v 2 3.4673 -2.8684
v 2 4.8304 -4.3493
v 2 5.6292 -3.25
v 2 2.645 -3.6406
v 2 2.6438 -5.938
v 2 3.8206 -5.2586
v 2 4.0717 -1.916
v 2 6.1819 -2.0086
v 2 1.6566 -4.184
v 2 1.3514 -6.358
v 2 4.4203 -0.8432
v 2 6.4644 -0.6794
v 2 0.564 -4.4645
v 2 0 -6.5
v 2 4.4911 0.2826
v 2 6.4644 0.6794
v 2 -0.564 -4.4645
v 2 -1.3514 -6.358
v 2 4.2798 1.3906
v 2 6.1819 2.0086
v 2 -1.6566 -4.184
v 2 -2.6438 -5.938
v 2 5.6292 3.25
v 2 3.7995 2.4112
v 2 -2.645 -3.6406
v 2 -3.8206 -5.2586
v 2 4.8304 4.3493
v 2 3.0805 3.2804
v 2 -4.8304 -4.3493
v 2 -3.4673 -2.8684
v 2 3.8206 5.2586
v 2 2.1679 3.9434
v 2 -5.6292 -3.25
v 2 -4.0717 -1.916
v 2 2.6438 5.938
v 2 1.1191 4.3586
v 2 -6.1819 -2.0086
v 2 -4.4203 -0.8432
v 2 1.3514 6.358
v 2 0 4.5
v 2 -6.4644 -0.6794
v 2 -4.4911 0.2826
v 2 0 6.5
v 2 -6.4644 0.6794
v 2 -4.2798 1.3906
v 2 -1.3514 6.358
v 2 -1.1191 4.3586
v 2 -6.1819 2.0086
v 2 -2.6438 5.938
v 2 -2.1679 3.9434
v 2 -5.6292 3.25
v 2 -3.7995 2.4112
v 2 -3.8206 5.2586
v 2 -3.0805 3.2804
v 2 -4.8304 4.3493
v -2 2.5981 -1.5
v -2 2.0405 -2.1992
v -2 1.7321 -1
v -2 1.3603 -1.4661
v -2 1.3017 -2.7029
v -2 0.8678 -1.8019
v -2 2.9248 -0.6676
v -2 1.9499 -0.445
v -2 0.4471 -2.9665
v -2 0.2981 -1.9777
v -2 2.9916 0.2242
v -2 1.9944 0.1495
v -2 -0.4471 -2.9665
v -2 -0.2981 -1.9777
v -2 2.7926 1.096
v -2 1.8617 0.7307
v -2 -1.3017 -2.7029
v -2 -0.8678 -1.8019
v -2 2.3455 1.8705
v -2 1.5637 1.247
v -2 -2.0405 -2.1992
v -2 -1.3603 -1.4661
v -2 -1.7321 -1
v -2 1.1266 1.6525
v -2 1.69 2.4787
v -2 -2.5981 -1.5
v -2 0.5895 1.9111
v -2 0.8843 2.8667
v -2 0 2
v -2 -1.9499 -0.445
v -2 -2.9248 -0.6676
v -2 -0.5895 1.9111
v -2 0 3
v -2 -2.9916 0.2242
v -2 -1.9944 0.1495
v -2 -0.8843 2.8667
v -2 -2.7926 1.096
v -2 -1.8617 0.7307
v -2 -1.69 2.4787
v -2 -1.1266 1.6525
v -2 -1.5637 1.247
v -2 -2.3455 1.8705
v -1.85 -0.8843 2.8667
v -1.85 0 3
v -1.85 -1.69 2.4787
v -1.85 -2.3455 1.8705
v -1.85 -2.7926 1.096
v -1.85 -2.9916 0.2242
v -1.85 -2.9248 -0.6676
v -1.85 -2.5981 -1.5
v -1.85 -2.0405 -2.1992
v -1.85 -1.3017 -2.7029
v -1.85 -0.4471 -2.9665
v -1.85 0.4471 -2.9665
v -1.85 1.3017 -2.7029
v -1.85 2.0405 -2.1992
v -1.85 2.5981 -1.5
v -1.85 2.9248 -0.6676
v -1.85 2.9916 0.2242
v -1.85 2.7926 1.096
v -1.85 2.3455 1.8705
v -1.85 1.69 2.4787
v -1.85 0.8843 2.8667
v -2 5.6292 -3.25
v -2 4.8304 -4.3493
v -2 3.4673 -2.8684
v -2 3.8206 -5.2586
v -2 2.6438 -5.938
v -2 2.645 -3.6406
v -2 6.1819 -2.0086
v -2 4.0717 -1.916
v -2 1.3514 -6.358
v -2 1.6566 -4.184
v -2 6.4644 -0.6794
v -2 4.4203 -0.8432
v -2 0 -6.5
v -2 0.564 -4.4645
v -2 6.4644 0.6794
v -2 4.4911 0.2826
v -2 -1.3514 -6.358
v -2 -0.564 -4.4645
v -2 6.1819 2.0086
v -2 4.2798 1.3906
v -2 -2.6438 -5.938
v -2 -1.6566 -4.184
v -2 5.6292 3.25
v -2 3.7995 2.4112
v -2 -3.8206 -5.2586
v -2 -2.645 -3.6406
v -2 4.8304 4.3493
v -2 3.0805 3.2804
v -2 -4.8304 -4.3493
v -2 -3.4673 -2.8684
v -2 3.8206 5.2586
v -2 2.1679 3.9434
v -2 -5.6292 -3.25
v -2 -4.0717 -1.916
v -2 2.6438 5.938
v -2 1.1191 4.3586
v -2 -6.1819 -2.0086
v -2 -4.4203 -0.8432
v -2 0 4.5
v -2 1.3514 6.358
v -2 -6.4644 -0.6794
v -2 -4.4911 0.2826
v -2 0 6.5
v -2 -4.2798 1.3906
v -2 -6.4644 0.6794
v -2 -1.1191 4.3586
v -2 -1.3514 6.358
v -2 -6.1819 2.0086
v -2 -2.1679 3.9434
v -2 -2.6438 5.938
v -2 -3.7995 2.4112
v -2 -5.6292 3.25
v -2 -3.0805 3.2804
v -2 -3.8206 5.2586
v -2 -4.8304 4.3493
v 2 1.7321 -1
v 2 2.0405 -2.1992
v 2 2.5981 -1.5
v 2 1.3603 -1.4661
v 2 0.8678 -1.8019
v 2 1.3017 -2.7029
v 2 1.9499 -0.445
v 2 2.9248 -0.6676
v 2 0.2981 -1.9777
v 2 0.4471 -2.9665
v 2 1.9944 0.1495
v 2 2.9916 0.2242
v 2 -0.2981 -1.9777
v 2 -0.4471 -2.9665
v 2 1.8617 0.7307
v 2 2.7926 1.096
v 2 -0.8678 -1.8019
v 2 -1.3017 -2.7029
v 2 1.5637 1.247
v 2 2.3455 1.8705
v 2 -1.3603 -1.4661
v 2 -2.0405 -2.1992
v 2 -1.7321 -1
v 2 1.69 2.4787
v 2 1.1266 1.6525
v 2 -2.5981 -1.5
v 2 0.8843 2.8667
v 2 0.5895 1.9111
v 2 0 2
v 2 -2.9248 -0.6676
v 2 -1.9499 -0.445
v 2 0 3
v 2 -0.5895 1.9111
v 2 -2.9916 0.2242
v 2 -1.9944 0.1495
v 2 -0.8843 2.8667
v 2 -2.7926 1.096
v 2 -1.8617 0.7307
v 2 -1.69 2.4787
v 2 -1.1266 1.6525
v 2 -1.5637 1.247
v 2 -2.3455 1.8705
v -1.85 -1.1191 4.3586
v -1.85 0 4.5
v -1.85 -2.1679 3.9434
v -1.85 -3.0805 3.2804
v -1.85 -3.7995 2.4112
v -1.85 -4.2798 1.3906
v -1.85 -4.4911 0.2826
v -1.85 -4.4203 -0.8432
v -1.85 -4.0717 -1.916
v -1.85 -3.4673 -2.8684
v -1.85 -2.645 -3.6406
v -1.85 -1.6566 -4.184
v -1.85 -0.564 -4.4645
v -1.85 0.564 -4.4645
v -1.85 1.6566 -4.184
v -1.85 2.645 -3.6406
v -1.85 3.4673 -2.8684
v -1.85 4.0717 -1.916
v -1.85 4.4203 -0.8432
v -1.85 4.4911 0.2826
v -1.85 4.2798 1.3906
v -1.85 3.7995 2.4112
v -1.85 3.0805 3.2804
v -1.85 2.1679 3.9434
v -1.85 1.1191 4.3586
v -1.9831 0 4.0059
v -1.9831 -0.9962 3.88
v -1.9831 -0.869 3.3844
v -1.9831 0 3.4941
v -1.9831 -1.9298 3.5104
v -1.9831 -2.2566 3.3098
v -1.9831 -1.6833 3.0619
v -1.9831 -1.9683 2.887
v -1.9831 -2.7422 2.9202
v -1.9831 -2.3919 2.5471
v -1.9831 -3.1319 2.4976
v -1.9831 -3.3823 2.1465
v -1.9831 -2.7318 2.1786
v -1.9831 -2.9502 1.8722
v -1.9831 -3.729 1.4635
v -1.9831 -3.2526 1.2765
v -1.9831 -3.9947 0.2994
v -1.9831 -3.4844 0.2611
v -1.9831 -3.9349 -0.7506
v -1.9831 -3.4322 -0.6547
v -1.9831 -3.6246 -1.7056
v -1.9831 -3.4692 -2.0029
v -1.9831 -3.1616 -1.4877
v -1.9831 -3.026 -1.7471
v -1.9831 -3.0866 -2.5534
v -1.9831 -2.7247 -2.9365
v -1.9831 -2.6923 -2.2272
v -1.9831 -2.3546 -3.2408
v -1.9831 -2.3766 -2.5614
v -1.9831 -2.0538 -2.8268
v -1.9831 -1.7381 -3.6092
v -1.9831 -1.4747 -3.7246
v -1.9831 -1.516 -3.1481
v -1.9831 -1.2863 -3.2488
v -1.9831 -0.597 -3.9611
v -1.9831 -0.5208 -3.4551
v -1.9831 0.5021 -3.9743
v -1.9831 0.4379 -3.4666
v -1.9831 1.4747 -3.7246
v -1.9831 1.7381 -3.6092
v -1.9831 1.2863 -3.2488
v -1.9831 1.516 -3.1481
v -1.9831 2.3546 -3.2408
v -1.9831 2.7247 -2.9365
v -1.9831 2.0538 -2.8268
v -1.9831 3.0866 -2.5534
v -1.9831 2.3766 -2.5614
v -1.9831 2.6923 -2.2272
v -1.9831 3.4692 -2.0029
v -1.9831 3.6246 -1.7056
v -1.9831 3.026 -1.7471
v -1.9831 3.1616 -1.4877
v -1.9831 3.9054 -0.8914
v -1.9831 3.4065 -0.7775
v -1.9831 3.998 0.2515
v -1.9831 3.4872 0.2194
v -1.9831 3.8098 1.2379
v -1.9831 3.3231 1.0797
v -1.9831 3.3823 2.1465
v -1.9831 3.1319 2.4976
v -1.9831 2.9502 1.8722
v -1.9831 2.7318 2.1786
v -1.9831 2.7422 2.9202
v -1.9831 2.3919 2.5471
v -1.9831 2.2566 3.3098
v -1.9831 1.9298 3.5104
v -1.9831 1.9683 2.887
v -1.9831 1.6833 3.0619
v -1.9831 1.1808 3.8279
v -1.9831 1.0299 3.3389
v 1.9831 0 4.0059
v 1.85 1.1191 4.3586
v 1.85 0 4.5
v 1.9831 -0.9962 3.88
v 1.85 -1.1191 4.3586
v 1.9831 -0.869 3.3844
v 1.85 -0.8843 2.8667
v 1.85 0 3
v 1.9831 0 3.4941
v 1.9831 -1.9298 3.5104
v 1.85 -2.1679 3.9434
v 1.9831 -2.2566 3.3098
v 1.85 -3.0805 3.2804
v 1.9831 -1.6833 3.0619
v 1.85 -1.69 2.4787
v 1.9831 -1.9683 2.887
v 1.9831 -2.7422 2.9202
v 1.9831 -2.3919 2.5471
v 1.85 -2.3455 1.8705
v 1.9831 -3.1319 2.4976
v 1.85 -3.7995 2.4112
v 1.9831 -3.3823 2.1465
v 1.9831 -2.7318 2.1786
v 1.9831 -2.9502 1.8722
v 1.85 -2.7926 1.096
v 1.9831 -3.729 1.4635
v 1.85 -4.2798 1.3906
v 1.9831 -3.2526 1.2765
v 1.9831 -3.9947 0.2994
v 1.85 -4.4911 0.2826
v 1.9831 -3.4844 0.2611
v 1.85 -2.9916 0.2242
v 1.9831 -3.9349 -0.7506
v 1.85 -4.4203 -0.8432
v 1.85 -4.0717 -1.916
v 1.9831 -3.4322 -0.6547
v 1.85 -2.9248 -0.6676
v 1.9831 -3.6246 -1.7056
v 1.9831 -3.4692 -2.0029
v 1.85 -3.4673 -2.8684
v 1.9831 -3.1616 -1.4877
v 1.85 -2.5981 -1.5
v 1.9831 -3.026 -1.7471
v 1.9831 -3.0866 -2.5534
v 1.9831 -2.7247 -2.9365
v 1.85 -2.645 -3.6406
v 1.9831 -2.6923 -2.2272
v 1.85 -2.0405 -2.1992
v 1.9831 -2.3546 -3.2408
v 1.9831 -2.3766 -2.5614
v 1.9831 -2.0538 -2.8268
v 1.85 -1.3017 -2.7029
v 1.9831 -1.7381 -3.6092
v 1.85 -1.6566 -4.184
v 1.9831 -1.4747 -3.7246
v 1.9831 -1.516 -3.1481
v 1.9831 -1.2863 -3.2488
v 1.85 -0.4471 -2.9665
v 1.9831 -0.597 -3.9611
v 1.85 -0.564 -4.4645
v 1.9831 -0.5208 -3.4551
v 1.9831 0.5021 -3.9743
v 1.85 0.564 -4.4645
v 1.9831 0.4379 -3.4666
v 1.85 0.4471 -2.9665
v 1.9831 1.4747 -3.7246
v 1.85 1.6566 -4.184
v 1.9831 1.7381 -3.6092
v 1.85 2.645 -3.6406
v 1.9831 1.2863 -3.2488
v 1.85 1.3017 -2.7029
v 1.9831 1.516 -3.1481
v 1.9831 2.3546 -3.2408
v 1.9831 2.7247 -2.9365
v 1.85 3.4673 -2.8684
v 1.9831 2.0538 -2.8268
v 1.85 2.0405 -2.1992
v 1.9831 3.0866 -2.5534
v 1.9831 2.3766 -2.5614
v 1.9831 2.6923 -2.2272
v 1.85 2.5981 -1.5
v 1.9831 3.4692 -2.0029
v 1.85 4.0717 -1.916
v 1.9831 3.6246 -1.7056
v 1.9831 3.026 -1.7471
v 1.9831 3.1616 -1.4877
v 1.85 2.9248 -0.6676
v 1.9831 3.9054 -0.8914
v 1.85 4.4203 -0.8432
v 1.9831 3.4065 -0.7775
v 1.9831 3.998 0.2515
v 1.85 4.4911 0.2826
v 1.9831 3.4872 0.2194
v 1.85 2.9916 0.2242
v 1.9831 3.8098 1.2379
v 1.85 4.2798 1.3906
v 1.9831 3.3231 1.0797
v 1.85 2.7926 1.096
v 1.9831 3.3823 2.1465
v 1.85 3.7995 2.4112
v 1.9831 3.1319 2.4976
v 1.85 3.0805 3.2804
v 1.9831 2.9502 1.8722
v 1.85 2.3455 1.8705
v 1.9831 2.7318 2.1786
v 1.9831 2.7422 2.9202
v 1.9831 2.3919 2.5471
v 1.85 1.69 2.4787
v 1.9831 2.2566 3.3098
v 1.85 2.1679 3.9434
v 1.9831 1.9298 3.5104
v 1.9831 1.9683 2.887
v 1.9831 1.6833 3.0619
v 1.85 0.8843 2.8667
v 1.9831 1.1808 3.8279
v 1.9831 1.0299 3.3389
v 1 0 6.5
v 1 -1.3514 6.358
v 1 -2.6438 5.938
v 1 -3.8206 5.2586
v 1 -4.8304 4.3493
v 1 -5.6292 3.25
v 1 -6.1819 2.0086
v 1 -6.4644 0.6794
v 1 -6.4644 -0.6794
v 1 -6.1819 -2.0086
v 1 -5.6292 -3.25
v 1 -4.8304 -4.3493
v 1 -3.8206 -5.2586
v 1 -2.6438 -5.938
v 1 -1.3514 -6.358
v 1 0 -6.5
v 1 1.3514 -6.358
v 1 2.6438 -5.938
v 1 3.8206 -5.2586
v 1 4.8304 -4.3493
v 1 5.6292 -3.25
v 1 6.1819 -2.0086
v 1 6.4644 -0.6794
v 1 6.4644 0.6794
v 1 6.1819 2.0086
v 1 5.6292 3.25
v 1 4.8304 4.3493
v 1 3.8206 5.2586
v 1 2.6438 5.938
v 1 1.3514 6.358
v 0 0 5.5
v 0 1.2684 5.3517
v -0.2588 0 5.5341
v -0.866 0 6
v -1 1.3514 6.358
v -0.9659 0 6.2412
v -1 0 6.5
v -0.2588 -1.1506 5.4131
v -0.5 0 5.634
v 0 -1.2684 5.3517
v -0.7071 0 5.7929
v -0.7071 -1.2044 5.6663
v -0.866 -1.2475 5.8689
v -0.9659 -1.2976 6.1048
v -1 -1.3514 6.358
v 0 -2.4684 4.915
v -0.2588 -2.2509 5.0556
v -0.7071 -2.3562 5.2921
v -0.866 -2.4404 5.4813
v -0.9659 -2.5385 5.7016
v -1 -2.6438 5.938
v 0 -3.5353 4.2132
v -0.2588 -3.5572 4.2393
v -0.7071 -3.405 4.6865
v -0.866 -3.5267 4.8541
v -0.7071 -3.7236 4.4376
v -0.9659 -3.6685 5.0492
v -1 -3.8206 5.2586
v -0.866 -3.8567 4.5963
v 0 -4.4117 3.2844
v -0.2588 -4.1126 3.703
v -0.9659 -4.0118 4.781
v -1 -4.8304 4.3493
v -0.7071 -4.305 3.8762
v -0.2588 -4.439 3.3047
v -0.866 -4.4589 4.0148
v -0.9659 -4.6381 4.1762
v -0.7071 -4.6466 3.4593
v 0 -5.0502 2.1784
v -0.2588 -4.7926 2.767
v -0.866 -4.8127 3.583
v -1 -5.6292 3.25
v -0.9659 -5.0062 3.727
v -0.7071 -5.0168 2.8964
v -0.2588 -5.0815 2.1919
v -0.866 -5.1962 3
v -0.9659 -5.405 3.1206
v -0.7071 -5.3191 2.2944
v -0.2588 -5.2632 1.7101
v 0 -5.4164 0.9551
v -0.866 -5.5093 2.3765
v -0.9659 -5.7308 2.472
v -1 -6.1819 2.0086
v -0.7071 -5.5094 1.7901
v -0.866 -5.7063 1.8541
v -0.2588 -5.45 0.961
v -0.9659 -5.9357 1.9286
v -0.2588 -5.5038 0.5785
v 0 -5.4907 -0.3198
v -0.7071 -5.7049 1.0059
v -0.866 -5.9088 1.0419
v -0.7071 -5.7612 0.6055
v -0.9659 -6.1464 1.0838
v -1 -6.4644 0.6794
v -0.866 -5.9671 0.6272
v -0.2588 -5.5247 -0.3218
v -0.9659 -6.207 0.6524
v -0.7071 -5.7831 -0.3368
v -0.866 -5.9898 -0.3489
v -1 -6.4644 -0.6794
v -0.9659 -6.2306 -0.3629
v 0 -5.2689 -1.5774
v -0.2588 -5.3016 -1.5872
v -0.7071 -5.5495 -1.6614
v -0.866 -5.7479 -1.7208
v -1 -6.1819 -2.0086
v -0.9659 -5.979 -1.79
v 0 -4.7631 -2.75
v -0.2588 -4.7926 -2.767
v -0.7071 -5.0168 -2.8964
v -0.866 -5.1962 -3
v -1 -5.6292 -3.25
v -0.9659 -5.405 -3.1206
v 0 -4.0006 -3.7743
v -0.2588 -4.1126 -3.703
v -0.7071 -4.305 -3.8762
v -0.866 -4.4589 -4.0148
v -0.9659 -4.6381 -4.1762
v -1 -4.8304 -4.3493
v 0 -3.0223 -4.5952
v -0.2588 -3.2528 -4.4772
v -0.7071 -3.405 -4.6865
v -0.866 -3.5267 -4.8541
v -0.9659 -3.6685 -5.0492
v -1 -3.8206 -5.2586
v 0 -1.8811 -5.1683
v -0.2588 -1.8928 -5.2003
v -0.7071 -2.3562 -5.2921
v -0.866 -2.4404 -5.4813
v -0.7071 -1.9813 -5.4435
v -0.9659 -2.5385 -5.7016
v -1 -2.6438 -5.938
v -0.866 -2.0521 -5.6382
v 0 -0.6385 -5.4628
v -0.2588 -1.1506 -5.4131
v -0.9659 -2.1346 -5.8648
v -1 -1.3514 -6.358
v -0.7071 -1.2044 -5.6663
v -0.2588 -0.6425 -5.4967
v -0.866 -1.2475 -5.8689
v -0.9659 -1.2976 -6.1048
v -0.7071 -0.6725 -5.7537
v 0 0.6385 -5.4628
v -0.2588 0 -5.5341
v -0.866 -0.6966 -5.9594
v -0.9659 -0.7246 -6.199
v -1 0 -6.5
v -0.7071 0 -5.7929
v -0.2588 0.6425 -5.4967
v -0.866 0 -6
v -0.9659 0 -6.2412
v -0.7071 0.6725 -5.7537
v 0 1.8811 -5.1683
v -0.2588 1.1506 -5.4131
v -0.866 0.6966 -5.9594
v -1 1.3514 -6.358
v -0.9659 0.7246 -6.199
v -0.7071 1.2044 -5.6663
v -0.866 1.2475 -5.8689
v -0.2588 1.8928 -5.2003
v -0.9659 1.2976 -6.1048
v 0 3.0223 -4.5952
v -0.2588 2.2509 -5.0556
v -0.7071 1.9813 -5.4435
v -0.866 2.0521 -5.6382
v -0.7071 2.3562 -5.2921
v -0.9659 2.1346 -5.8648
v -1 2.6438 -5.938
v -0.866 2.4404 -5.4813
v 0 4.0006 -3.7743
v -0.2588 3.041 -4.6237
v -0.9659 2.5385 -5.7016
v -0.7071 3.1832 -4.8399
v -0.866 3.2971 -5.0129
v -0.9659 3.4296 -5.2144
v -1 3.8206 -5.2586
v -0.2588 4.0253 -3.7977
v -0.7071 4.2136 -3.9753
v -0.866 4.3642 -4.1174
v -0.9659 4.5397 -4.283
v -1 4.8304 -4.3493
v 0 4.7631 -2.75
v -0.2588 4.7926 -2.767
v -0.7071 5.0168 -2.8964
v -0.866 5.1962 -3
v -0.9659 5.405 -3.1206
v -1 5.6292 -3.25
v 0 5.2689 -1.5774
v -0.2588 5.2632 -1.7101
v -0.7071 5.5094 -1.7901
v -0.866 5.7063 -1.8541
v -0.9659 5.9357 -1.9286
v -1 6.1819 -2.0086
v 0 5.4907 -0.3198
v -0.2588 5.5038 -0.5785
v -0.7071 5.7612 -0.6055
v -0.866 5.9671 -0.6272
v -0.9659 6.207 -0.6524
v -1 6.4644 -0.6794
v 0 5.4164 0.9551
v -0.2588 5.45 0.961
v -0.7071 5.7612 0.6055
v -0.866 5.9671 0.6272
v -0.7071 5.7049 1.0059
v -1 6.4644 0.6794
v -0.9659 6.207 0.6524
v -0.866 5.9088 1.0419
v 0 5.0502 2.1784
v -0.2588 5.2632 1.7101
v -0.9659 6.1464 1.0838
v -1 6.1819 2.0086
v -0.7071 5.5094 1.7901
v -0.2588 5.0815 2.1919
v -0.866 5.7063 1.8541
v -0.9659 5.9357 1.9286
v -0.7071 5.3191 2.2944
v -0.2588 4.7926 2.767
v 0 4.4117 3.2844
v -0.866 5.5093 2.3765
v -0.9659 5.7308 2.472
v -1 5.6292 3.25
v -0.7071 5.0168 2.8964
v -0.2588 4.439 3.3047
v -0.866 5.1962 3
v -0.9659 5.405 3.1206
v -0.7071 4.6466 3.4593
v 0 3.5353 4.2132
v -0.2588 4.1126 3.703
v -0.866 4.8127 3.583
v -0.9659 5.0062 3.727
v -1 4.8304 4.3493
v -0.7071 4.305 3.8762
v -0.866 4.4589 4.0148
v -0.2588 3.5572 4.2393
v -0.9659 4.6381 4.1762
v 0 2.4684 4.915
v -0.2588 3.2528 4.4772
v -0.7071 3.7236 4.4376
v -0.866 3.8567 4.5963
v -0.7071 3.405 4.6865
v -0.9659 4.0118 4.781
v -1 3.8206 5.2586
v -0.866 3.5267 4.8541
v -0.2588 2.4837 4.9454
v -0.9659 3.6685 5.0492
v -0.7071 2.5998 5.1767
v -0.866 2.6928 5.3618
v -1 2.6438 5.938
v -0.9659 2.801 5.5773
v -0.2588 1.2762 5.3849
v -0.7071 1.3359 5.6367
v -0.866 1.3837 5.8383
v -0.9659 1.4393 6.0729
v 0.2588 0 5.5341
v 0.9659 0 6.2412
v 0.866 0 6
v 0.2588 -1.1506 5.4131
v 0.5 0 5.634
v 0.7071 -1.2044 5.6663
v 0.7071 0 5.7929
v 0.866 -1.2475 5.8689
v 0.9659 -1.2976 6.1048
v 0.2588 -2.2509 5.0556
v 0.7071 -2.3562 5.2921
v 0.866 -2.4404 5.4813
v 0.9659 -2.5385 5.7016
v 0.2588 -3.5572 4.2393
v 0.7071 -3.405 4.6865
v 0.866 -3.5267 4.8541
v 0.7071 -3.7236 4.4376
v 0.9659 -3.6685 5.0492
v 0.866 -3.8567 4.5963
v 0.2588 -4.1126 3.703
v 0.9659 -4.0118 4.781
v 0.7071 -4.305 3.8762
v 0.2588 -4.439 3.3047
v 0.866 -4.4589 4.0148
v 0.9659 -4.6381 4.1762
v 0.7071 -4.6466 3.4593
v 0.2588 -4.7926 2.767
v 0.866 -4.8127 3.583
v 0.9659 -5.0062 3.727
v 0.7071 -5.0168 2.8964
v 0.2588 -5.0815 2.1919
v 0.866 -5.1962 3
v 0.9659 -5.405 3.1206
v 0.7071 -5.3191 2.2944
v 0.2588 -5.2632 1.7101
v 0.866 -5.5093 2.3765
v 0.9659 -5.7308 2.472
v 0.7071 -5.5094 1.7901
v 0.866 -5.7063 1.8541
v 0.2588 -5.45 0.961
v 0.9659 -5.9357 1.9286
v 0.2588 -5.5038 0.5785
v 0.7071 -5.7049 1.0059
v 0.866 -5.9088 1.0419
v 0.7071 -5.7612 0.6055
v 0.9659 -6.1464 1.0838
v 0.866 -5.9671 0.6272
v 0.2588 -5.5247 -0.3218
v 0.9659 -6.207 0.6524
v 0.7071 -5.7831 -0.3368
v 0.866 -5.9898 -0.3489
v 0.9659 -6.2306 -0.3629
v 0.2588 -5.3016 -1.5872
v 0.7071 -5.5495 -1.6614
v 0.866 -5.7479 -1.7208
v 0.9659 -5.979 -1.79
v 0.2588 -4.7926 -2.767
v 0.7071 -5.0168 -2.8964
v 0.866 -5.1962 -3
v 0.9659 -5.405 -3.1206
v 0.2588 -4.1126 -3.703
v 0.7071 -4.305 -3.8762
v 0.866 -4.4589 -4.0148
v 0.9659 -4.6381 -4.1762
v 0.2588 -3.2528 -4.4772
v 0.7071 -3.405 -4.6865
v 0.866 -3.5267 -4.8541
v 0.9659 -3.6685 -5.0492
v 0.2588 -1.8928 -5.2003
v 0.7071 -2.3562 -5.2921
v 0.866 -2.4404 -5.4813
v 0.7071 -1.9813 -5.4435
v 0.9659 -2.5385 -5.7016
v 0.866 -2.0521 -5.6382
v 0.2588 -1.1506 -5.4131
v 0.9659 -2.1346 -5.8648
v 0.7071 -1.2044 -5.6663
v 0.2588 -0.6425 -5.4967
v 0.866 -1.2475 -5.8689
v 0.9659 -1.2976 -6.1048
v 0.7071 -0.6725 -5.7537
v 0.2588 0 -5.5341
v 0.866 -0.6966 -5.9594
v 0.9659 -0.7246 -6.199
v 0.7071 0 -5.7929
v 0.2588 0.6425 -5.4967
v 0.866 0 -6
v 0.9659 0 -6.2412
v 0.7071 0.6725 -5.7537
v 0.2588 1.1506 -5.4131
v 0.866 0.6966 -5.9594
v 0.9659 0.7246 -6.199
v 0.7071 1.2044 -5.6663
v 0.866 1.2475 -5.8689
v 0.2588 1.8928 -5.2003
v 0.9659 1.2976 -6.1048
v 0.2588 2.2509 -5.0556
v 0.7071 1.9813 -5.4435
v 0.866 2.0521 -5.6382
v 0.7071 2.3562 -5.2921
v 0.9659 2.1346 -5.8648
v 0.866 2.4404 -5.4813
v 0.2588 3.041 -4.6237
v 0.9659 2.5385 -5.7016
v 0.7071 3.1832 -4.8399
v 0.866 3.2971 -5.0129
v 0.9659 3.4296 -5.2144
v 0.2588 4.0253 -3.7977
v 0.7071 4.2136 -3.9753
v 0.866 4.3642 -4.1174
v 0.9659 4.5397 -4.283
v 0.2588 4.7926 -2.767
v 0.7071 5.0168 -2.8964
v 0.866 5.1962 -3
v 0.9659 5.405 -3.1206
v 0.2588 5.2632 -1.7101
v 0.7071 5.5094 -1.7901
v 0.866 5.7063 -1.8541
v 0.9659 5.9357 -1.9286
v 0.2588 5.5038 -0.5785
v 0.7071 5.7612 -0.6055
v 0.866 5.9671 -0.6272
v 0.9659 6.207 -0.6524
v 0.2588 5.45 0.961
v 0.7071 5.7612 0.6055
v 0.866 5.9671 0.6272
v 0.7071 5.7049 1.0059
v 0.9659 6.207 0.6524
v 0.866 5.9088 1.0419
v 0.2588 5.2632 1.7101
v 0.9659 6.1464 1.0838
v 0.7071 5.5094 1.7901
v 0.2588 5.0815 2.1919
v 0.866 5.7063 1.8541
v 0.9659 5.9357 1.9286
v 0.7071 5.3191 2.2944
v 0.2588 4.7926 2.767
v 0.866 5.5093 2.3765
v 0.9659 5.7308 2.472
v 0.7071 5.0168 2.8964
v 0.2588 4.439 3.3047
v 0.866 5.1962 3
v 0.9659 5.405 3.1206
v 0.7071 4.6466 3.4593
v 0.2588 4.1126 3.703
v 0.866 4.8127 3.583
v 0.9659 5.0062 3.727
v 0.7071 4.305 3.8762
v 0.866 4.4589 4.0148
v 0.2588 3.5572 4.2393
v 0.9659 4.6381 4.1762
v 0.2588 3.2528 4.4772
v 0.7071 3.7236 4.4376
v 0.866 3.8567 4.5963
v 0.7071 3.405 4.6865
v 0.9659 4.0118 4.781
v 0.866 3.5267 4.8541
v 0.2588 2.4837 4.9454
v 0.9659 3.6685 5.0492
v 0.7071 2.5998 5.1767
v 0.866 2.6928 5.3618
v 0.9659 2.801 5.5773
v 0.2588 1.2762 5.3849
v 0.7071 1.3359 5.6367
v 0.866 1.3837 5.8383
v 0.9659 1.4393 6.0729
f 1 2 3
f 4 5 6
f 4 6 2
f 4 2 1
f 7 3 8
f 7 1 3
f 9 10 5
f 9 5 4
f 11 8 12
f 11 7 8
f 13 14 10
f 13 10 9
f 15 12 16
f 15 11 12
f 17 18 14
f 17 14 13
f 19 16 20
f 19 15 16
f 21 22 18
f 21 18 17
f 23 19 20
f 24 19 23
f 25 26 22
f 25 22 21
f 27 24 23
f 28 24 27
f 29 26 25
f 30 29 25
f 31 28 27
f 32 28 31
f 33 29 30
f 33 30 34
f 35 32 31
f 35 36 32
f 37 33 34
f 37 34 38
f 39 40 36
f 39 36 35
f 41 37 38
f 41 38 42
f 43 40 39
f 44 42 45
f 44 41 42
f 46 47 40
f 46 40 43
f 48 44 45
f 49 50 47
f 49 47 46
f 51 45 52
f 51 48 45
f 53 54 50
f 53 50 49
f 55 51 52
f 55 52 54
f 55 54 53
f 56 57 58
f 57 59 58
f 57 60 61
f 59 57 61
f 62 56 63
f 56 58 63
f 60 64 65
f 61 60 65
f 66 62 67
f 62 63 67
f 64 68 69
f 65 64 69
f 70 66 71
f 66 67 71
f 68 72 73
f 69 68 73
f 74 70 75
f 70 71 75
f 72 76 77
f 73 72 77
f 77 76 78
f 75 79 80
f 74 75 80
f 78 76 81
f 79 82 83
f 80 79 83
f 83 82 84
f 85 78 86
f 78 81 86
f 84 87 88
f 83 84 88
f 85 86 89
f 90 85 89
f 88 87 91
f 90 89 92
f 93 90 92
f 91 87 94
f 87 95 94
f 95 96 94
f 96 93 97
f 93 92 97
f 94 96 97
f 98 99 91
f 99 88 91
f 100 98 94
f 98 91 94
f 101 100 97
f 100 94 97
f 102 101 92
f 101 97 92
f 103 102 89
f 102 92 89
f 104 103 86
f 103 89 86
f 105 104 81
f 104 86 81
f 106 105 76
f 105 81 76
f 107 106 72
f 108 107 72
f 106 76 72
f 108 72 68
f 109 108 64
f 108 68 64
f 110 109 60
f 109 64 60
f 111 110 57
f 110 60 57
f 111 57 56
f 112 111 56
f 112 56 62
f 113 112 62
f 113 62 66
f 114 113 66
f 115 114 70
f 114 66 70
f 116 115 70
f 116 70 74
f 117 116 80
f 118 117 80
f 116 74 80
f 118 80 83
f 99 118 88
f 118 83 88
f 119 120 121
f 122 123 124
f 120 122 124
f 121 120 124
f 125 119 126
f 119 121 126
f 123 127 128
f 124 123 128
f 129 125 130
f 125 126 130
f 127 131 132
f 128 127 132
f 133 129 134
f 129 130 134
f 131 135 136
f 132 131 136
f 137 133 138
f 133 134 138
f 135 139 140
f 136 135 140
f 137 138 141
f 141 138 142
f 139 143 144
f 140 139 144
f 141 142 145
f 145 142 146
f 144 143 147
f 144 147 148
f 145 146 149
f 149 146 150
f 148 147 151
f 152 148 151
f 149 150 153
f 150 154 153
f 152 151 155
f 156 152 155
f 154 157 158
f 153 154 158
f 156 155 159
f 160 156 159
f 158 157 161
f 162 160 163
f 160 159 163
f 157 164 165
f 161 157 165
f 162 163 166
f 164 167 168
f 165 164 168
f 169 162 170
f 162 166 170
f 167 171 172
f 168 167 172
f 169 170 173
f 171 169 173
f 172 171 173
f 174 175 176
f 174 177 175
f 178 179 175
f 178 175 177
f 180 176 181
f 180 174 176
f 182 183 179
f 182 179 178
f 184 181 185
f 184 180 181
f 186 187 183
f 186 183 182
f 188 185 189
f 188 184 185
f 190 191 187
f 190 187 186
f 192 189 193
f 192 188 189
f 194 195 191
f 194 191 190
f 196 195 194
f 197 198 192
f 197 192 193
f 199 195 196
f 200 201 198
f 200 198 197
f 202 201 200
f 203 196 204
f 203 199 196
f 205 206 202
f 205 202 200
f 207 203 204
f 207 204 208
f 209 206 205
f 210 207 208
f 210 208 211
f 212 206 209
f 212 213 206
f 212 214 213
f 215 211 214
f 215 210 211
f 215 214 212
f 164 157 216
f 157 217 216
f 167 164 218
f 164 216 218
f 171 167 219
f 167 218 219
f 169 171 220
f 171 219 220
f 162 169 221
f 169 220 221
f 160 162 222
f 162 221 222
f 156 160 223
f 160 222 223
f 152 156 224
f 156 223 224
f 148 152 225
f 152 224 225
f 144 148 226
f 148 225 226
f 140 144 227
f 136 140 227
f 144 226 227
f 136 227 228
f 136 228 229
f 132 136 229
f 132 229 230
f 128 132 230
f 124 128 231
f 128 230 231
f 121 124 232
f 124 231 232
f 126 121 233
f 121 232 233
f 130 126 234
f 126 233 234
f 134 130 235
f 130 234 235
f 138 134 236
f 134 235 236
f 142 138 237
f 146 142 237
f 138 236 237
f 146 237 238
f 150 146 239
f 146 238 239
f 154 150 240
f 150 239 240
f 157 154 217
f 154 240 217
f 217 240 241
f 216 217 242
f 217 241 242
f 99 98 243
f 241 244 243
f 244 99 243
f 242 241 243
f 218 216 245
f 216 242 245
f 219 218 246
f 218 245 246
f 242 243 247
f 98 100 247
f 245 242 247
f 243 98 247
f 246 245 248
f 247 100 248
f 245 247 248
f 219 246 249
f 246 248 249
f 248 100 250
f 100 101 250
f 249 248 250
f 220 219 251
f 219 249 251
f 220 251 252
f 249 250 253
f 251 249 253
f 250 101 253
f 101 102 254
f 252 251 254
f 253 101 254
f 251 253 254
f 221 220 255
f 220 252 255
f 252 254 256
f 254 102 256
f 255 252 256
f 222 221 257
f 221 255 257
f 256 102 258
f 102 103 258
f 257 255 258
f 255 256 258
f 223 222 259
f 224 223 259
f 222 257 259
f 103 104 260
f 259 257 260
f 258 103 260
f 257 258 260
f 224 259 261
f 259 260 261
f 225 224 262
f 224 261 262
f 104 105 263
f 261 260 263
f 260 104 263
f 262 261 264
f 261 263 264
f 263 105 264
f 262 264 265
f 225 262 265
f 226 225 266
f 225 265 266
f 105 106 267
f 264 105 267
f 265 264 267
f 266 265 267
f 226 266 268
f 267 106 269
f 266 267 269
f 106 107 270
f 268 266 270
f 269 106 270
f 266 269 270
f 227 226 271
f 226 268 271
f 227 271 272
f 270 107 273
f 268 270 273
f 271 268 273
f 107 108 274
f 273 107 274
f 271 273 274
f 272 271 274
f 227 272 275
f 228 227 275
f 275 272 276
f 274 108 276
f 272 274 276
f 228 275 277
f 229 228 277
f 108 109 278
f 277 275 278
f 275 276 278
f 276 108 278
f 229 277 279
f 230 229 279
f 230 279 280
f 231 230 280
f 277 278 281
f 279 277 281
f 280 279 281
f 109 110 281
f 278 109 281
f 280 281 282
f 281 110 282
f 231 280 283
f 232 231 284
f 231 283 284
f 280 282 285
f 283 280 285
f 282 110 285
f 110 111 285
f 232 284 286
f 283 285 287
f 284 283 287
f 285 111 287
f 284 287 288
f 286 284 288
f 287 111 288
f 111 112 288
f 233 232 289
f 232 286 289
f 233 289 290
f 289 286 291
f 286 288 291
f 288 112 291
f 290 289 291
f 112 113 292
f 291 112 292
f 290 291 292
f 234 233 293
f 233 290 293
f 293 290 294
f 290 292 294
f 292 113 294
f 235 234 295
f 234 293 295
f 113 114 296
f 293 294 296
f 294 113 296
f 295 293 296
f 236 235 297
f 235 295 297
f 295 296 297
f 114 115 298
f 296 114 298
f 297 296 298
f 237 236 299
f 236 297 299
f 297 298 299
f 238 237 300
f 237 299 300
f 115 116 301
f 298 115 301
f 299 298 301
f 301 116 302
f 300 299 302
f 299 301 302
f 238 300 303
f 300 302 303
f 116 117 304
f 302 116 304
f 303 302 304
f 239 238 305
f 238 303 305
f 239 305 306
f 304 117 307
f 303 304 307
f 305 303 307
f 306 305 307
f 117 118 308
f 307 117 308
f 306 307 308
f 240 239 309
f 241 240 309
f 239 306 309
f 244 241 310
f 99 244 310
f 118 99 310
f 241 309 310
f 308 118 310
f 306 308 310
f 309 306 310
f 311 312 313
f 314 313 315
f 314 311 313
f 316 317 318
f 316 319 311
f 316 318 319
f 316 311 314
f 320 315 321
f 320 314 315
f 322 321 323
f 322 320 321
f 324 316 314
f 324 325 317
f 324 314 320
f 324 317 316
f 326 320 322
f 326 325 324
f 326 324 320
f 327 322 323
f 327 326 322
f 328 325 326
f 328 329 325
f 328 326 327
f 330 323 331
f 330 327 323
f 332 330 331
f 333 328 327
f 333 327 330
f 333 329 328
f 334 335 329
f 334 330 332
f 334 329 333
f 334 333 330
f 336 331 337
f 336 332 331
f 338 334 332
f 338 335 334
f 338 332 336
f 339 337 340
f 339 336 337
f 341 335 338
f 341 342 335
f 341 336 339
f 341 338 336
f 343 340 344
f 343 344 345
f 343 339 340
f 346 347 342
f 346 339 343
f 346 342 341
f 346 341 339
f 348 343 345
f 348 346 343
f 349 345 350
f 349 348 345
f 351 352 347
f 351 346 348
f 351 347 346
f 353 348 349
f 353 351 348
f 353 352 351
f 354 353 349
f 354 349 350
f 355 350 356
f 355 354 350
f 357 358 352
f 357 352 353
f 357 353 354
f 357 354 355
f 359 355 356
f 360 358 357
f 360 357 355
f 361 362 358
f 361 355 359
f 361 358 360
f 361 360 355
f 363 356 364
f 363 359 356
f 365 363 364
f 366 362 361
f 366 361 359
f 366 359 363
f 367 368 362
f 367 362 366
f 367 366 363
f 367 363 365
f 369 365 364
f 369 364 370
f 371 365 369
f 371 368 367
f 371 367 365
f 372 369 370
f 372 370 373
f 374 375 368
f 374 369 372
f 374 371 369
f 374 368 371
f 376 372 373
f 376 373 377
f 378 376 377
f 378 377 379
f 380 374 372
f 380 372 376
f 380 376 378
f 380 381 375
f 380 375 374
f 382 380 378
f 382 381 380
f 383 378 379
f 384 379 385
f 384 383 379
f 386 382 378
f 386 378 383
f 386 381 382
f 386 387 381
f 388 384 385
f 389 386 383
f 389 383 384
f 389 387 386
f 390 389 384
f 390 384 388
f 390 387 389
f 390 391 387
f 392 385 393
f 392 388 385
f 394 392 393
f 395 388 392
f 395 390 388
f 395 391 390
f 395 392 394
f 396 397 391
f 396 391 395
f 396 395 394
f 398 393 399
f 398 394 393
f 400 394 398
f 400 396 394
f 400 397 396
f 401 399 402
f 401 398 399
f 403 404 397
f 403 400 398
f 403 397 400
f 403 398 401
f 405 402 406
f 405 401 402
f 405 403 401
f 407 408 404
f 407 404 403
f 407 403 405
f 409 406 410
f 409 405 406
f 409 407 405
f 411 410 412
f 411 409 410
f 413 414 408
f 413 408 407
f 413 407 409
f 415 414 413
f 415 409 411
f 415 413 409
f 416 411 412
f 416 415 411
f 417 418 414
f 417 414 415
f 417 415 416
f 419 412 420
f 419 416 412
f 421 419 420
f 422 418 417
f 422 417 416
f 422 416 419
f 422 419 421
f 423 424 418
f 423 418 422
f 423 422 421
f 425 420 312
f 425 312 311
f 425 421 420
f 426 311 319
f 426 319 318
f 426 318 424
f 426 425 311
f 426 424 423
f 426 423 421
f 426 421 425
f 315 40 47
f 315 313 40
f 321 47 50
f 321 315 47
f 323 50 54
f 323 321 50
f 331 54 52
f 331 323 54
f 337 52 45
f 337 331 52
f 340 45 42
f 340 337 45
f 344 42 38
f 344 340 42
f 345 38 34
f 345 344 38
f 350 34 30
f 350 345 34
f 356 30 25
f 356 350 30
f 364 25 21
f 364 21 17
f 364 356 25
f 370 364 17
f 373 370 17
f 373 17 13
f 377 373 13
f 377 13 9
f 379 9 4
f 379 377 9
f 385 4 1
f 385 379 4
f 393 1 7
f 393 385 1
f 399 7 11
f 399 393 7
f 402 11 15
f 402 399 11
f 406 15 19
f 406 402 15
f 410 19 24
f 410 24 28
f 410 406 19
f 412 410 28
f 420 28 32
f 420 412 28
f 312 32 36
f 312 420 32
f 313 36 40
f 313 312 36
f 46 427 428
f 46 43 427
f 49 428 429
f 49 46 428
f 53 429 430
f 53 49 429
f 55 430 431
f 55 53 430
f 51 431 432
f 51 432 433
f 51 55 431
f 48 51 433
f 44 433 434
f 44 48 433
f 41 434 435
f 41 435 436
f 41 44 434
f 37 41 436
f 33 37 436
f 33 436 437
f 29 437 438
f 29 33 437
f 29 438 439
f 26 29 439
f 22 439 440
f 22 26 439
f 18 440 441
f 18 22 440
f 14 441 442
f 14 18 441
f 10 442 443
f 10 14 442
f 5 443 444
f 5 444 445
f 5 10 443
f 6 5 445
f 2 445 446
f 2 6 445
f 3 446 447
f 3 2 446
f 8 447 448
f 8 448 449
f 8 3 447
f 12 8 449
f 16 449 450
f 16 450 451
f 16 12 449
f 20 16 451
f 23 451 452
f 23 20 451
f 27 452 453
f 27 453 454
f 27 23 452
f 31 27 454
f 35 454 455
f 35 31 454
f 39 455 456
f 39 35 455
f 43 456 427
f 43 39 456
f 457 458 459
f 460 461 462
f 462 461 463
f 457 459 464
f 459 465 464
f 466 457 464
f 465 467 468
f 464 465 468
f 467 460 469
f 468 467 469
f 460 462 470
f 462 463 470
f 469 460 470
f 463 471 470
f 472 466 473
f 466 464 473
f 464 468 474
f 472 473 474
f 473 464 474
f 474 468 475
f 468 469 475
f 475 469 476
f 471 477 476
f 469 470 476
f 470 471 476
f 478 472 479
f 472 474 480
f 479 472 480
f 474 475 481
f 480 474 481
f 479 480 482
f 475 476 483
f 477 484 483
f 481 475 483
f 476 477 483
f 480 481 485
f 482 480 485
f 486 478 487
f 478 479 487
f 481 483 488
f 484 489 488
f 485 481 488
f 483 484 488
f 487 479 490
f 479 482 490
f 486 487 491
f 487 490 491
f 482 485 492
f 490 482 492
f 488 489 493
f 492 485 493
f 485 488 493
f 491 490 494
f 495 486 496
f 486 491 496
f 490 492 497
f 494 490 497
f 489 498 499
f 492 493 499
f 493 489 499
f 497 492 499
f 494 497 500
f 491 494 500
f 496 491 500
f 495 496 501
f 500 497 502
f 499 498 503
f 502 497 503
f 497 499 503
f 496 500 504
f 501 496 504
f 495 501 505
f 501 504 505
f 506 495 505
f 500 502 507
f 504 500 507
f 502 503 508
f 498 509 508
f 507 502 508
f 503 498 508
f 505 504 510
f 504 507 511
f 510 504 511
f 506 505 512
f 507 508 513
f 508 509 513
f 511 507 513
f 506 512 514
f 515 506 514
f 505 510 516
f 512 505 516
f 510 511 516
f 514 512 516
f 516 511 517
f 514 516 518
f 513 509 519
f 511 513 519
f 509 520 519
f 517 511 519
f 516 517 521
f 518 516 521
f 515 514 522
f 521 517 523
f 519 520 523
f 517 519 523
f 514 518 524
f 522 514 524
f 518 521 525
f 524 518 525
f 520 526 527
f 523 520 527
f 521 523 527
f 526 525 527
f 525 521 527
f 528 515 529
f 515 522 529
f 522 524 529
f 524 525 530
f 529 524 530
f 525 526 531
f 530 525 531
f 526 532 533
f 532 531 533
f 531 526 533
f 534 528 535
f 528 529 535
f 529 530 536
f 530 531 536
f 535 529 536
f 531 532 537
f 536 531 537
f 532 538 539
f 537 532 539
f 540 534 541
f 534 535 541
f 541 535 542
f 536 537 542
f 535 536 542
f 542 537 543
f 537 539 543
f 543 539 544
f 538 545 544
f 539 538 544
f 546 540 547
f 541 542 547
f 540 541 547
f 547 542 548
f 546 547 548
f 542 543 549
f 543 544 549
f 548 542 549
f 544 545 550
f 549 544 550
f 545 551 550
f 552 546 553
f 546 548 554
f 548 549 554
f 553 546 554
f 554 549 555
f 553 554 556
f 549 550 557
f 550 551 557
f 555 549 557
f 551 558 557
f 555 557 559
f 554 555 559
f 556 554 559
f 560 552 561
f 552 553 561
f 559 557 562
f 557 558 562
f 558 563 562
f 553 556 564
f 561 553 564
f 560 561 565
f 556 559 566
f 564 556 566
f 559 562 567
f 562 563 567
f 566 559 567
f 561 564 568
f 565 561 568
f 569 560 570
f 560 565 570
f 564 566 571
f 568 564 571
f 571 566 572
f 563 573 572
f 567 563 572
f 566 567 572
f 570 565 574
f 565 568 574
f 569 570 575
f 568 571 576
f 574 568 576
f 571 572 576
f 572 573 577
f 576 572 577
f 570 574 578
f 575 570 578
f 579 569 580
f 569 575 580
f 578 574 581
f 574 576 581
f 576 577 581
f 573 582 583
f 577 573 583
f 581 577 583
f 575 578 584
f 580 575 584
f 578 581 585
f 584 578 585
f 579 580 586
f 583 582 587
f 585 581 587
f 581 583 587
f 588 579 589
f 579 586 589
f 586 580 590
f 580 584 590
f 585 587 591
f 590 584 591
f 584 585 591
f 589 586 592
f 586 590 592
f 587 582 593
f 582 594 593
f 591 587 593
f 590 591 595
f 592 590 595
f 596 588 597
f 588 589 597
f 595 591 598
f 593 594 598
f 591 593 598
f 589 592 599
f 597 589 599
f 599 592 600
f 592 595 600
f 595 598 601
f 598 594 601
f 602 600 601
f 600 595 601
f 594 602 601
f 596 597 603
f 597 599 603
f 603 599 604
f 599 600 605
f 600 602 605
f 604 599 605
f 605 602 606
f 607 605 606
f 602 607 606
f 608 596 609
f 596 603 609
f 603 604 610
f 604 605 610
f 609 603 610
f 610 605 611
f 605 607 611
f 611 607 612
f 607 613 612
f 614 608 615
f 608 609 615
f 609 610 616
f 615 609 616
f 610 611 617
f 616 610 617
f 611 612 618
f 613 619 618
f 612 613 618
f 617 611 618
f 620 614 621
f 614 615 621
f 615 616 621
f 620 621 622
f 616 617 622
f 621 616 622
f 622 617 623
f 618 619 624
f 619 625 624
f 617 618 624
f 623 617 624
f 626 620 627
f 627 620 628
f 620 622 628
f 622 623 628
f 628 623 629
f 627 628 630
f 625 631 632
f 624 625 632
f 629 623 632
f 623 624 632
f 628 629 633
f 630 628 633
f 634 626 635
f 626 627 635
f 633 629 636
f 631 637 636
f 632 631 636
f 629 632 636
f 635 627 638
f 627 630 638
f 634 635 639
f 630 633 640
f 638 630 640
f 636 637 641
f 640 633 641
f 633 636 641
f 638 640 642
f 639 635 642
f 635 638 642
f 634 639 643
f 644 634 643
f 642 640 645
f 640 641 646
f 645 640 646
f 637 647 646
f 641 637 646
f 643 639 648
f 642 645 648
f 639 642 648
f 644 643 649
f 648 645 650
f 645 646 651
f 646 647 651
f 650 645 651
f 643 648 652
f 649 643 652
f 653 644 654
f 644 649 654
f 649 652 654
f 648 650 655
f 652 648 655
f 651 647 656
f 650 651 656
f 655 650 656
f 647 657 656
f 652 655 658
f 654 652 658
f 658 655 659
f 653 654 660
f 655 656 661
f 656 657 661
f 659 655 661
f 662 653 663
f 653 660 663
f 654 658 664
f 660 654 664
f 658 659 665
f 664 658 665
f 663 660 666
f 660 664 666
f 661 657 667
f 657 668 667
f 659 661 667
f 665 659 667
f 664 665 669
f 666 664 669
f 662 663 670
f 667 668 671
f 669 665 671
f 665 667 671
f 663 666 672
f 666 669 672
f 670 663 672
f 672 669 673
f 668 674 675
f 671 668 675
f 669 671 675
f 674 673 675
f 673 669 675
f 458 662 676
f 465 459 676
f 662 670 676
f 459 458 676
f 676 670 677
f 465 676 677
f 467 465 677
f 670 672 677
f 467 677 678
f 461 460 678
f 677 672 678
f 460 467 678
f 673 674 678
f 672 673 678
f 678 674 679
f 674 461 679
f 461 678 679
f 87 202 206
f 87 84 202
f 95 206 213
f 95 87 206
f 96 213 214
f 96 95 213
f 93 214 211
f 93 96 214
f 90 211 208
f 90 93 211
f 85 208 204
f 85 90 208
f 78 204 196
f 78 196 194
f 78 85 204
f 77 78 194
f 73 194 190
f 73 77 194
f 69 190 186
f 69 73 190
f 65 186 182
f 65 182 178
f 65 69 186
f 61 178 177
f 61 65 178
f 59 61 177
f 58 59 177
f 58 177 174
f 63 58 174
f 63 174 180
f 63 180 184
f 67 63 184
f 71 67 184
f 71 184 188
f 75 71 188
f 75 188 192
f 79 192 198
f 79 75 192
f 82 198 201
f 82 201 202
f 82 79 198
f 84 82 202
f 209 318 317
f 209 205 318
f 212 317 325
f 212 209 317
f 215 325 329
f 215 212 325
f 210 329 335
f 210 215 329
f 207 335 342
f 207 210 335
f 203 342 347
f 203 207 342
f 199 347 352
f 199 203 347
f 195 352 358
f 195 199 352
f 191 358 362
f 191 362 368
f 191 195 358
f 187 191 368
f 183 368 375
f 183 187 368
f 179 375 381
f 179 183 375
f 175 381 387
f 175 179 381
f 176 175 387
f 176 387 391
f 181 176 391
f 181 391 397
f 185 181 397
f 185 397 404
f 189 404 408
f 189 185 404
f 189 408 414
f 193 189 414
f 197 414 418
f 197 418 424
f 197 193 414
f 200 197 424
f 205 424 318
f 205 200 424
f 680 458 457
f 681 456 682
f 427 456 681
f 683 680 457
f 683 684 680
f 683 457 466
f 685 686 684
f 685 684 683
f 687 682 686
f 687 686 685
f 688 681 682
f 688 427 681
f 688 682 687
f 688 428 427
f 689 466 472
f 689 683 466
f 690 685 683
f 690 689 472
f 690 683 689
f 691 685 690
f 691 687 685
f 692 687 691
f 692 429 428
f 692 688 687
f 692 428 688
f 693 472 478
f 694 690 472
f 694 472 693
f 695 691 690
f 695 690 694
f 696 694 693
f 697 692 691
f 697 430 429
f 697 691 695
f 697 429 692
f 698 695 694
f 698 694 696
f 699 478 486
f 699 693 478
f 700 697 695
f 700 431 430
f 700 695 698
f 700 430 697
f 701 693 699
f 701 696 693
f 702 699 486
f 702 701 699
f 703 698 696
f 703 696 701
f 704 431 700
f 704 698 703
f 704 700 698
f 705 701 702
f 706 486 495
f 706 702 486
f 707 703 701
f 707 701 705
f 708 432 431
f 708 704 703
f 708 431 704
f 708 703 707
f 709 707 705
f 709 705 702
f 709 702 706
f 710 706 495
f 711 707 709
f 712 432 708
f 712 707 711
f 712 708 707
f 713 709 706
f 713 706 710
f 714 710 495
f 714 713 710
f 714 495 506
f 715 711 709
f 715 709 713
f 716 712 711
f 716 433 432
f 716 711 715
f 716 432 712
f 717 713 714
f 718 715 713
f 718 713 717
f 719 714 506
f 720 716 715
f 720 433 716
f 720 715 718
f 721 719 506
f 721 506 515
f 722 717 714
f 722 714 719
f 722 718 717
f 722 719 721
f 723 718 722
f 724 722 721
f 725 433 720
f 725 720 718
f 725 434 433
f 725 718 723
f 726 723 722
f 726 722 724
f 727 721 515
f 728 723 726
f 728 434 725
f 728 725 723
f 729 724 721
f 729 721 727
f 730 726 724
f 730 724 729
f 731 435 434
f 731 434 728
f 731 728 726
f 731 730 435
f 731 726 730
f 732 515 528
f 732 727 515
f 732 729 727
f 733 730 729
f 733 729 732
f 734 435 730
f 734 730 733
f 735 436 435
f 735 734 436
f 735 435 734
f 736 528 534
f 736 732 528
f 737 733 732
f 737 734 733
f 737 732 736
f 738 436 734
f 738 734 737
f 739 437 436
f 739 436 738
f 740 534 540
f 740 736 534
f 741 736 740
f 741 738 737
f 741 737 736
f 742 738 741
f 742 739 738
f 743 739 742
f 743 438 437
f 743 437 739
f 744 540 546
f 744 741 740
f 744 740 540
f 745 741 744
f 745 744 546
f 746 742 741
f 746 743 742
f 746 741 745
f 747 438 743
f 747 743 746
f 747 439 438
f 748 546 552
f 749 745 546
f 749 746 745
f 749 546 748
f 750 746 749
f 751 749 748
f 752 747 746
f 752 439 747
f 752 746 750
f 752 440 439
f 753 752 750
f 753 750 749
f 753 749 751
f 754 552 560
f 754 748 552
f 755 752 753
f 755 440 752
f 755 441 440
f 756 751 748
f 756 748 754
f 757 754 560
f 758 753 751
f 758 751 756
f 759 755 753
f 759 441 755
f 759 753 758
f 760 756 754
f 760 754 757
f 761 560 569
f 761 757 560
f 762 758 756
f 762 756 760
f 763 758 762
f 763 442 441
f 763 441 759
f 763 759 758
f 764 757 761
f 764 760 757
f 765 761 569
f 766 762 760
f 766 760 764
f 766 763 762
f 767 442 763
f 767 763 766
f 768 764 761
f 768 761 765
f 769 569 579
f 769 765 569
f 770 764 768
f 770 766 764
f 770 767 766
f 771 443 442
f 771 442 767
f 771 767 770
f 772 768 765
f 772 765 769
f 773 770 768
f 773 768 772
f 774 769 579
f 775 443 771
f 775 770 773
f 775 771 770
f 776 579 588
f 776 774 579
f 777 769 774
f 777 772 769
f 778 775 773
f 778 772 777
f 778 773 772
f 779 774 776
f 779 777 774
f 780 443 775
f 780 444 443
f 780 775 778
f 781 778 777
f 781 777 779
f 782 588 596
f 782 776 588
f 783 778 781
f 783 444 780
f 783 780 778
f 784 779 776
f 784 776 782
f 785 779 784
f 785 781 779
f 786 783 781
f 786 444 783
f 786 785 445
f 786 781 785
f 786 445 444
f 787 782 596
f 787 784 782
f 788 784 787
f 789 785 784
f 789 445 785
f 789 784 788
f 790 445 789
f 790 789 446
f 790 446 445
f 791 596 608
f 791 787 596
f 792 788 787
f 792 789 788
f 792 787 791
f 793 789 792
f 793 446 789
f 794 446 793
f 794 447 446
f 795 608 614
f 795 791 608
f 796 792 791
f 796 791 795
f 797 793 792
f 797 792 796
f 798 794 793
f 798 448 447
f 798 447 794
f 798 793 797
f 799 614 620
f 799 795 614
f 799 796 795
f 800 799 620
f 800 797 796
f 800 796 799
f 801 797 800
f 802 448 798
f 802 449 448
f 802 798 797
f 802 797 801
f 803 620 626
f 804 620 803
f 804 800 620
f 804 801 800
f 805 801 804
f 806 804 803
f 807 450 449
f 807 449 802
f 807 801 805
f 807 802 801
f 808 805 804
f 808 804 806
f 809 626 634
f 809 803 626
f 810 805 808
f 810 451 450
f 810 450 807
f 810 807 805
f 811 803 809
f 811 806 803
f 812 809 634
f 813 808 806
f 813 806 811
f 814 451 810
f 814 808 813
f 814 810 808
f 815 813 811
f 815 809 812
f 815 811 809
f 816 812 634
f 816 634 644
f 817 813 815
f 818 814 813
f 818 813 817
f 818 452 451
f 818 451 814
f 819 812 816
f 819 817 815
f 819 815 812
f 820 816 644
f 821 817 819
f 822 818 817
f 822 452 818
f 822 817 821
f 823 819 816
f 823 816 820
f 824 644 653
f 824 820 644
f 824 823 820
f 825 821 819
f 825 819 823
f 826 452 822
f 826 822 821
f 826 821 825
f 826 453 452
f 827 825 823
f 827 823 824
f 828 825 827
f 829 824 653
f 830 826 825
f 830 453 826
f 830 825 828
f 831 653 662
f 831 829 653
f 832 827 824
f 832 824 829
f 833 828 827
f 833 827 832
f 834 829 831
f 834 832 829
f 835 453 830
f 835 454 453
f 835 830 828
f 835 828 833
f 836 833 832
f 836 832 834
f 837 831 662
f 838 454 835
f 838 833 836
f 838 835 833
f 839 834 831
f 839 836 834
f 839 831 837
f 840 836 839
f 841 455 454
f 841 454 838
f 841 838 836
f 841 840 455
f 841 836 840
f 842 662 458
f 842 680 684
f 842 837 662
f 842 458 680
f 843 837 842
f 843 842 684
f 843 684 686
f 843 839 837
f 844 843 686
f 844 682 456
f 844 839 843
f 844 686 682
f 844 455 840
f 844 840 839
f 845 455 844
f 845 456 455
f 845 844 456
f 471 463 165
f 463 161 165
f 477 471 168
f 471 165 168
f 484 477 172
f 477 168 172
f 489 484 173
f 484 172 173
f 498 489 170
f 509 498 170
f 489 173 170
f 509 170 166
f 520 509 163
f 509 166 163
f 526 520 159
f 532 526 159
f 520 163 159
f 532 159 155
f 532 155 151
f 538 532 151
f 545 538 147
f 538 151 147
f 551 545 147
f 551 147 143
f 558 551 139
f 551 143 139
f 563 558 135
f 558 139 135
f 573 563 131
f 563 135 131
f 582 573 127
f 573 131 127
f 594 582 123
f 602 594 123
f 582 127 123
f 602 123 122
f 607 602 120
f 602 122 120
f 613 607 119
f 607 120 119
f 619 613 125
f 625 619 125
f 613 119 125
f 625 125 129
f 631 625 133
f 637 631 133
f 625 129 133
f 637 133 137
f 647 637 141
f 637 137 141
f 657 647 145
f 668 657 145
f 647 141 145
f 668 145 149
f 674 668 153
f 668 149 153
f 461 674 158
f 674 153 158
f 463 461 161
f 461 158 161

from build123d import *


with BuildPart() as f1:
    # F0 (on Front) → F1 (revolve)
    with BuildSketch(Plane.XZ):
        with BuildLine():
            Line((-2, 2), (0, 2))
            Line((0, 2), (0, 5.5))
            ThreePointArc((0, 5.5), (-0.707107, 5.792893), (-1, 6.5))
            Line((-1, 6.5), (-2, 6.5))
            Line((-2, 6.5), (-2, 4.5))
            Line((-2, 4.5), (-1.85, 4.5))
            ThreePointArc((-1.85, 4.5), (-2, 3.75), (-1.85, 3))
            Line((-1.85, 3), (-2, 3))
            Line((-2, 3), (-2, 2))
        make_face()
    revolve(axis=Axis((-0.379604, 0, 0), (1, 0, 0)))

    # F2: F1 across face


with BuildPart() as f1_1:
    add(f1.part)
    add(f1.part.mirror(Plane.YZ))


solid = f1_1.part
